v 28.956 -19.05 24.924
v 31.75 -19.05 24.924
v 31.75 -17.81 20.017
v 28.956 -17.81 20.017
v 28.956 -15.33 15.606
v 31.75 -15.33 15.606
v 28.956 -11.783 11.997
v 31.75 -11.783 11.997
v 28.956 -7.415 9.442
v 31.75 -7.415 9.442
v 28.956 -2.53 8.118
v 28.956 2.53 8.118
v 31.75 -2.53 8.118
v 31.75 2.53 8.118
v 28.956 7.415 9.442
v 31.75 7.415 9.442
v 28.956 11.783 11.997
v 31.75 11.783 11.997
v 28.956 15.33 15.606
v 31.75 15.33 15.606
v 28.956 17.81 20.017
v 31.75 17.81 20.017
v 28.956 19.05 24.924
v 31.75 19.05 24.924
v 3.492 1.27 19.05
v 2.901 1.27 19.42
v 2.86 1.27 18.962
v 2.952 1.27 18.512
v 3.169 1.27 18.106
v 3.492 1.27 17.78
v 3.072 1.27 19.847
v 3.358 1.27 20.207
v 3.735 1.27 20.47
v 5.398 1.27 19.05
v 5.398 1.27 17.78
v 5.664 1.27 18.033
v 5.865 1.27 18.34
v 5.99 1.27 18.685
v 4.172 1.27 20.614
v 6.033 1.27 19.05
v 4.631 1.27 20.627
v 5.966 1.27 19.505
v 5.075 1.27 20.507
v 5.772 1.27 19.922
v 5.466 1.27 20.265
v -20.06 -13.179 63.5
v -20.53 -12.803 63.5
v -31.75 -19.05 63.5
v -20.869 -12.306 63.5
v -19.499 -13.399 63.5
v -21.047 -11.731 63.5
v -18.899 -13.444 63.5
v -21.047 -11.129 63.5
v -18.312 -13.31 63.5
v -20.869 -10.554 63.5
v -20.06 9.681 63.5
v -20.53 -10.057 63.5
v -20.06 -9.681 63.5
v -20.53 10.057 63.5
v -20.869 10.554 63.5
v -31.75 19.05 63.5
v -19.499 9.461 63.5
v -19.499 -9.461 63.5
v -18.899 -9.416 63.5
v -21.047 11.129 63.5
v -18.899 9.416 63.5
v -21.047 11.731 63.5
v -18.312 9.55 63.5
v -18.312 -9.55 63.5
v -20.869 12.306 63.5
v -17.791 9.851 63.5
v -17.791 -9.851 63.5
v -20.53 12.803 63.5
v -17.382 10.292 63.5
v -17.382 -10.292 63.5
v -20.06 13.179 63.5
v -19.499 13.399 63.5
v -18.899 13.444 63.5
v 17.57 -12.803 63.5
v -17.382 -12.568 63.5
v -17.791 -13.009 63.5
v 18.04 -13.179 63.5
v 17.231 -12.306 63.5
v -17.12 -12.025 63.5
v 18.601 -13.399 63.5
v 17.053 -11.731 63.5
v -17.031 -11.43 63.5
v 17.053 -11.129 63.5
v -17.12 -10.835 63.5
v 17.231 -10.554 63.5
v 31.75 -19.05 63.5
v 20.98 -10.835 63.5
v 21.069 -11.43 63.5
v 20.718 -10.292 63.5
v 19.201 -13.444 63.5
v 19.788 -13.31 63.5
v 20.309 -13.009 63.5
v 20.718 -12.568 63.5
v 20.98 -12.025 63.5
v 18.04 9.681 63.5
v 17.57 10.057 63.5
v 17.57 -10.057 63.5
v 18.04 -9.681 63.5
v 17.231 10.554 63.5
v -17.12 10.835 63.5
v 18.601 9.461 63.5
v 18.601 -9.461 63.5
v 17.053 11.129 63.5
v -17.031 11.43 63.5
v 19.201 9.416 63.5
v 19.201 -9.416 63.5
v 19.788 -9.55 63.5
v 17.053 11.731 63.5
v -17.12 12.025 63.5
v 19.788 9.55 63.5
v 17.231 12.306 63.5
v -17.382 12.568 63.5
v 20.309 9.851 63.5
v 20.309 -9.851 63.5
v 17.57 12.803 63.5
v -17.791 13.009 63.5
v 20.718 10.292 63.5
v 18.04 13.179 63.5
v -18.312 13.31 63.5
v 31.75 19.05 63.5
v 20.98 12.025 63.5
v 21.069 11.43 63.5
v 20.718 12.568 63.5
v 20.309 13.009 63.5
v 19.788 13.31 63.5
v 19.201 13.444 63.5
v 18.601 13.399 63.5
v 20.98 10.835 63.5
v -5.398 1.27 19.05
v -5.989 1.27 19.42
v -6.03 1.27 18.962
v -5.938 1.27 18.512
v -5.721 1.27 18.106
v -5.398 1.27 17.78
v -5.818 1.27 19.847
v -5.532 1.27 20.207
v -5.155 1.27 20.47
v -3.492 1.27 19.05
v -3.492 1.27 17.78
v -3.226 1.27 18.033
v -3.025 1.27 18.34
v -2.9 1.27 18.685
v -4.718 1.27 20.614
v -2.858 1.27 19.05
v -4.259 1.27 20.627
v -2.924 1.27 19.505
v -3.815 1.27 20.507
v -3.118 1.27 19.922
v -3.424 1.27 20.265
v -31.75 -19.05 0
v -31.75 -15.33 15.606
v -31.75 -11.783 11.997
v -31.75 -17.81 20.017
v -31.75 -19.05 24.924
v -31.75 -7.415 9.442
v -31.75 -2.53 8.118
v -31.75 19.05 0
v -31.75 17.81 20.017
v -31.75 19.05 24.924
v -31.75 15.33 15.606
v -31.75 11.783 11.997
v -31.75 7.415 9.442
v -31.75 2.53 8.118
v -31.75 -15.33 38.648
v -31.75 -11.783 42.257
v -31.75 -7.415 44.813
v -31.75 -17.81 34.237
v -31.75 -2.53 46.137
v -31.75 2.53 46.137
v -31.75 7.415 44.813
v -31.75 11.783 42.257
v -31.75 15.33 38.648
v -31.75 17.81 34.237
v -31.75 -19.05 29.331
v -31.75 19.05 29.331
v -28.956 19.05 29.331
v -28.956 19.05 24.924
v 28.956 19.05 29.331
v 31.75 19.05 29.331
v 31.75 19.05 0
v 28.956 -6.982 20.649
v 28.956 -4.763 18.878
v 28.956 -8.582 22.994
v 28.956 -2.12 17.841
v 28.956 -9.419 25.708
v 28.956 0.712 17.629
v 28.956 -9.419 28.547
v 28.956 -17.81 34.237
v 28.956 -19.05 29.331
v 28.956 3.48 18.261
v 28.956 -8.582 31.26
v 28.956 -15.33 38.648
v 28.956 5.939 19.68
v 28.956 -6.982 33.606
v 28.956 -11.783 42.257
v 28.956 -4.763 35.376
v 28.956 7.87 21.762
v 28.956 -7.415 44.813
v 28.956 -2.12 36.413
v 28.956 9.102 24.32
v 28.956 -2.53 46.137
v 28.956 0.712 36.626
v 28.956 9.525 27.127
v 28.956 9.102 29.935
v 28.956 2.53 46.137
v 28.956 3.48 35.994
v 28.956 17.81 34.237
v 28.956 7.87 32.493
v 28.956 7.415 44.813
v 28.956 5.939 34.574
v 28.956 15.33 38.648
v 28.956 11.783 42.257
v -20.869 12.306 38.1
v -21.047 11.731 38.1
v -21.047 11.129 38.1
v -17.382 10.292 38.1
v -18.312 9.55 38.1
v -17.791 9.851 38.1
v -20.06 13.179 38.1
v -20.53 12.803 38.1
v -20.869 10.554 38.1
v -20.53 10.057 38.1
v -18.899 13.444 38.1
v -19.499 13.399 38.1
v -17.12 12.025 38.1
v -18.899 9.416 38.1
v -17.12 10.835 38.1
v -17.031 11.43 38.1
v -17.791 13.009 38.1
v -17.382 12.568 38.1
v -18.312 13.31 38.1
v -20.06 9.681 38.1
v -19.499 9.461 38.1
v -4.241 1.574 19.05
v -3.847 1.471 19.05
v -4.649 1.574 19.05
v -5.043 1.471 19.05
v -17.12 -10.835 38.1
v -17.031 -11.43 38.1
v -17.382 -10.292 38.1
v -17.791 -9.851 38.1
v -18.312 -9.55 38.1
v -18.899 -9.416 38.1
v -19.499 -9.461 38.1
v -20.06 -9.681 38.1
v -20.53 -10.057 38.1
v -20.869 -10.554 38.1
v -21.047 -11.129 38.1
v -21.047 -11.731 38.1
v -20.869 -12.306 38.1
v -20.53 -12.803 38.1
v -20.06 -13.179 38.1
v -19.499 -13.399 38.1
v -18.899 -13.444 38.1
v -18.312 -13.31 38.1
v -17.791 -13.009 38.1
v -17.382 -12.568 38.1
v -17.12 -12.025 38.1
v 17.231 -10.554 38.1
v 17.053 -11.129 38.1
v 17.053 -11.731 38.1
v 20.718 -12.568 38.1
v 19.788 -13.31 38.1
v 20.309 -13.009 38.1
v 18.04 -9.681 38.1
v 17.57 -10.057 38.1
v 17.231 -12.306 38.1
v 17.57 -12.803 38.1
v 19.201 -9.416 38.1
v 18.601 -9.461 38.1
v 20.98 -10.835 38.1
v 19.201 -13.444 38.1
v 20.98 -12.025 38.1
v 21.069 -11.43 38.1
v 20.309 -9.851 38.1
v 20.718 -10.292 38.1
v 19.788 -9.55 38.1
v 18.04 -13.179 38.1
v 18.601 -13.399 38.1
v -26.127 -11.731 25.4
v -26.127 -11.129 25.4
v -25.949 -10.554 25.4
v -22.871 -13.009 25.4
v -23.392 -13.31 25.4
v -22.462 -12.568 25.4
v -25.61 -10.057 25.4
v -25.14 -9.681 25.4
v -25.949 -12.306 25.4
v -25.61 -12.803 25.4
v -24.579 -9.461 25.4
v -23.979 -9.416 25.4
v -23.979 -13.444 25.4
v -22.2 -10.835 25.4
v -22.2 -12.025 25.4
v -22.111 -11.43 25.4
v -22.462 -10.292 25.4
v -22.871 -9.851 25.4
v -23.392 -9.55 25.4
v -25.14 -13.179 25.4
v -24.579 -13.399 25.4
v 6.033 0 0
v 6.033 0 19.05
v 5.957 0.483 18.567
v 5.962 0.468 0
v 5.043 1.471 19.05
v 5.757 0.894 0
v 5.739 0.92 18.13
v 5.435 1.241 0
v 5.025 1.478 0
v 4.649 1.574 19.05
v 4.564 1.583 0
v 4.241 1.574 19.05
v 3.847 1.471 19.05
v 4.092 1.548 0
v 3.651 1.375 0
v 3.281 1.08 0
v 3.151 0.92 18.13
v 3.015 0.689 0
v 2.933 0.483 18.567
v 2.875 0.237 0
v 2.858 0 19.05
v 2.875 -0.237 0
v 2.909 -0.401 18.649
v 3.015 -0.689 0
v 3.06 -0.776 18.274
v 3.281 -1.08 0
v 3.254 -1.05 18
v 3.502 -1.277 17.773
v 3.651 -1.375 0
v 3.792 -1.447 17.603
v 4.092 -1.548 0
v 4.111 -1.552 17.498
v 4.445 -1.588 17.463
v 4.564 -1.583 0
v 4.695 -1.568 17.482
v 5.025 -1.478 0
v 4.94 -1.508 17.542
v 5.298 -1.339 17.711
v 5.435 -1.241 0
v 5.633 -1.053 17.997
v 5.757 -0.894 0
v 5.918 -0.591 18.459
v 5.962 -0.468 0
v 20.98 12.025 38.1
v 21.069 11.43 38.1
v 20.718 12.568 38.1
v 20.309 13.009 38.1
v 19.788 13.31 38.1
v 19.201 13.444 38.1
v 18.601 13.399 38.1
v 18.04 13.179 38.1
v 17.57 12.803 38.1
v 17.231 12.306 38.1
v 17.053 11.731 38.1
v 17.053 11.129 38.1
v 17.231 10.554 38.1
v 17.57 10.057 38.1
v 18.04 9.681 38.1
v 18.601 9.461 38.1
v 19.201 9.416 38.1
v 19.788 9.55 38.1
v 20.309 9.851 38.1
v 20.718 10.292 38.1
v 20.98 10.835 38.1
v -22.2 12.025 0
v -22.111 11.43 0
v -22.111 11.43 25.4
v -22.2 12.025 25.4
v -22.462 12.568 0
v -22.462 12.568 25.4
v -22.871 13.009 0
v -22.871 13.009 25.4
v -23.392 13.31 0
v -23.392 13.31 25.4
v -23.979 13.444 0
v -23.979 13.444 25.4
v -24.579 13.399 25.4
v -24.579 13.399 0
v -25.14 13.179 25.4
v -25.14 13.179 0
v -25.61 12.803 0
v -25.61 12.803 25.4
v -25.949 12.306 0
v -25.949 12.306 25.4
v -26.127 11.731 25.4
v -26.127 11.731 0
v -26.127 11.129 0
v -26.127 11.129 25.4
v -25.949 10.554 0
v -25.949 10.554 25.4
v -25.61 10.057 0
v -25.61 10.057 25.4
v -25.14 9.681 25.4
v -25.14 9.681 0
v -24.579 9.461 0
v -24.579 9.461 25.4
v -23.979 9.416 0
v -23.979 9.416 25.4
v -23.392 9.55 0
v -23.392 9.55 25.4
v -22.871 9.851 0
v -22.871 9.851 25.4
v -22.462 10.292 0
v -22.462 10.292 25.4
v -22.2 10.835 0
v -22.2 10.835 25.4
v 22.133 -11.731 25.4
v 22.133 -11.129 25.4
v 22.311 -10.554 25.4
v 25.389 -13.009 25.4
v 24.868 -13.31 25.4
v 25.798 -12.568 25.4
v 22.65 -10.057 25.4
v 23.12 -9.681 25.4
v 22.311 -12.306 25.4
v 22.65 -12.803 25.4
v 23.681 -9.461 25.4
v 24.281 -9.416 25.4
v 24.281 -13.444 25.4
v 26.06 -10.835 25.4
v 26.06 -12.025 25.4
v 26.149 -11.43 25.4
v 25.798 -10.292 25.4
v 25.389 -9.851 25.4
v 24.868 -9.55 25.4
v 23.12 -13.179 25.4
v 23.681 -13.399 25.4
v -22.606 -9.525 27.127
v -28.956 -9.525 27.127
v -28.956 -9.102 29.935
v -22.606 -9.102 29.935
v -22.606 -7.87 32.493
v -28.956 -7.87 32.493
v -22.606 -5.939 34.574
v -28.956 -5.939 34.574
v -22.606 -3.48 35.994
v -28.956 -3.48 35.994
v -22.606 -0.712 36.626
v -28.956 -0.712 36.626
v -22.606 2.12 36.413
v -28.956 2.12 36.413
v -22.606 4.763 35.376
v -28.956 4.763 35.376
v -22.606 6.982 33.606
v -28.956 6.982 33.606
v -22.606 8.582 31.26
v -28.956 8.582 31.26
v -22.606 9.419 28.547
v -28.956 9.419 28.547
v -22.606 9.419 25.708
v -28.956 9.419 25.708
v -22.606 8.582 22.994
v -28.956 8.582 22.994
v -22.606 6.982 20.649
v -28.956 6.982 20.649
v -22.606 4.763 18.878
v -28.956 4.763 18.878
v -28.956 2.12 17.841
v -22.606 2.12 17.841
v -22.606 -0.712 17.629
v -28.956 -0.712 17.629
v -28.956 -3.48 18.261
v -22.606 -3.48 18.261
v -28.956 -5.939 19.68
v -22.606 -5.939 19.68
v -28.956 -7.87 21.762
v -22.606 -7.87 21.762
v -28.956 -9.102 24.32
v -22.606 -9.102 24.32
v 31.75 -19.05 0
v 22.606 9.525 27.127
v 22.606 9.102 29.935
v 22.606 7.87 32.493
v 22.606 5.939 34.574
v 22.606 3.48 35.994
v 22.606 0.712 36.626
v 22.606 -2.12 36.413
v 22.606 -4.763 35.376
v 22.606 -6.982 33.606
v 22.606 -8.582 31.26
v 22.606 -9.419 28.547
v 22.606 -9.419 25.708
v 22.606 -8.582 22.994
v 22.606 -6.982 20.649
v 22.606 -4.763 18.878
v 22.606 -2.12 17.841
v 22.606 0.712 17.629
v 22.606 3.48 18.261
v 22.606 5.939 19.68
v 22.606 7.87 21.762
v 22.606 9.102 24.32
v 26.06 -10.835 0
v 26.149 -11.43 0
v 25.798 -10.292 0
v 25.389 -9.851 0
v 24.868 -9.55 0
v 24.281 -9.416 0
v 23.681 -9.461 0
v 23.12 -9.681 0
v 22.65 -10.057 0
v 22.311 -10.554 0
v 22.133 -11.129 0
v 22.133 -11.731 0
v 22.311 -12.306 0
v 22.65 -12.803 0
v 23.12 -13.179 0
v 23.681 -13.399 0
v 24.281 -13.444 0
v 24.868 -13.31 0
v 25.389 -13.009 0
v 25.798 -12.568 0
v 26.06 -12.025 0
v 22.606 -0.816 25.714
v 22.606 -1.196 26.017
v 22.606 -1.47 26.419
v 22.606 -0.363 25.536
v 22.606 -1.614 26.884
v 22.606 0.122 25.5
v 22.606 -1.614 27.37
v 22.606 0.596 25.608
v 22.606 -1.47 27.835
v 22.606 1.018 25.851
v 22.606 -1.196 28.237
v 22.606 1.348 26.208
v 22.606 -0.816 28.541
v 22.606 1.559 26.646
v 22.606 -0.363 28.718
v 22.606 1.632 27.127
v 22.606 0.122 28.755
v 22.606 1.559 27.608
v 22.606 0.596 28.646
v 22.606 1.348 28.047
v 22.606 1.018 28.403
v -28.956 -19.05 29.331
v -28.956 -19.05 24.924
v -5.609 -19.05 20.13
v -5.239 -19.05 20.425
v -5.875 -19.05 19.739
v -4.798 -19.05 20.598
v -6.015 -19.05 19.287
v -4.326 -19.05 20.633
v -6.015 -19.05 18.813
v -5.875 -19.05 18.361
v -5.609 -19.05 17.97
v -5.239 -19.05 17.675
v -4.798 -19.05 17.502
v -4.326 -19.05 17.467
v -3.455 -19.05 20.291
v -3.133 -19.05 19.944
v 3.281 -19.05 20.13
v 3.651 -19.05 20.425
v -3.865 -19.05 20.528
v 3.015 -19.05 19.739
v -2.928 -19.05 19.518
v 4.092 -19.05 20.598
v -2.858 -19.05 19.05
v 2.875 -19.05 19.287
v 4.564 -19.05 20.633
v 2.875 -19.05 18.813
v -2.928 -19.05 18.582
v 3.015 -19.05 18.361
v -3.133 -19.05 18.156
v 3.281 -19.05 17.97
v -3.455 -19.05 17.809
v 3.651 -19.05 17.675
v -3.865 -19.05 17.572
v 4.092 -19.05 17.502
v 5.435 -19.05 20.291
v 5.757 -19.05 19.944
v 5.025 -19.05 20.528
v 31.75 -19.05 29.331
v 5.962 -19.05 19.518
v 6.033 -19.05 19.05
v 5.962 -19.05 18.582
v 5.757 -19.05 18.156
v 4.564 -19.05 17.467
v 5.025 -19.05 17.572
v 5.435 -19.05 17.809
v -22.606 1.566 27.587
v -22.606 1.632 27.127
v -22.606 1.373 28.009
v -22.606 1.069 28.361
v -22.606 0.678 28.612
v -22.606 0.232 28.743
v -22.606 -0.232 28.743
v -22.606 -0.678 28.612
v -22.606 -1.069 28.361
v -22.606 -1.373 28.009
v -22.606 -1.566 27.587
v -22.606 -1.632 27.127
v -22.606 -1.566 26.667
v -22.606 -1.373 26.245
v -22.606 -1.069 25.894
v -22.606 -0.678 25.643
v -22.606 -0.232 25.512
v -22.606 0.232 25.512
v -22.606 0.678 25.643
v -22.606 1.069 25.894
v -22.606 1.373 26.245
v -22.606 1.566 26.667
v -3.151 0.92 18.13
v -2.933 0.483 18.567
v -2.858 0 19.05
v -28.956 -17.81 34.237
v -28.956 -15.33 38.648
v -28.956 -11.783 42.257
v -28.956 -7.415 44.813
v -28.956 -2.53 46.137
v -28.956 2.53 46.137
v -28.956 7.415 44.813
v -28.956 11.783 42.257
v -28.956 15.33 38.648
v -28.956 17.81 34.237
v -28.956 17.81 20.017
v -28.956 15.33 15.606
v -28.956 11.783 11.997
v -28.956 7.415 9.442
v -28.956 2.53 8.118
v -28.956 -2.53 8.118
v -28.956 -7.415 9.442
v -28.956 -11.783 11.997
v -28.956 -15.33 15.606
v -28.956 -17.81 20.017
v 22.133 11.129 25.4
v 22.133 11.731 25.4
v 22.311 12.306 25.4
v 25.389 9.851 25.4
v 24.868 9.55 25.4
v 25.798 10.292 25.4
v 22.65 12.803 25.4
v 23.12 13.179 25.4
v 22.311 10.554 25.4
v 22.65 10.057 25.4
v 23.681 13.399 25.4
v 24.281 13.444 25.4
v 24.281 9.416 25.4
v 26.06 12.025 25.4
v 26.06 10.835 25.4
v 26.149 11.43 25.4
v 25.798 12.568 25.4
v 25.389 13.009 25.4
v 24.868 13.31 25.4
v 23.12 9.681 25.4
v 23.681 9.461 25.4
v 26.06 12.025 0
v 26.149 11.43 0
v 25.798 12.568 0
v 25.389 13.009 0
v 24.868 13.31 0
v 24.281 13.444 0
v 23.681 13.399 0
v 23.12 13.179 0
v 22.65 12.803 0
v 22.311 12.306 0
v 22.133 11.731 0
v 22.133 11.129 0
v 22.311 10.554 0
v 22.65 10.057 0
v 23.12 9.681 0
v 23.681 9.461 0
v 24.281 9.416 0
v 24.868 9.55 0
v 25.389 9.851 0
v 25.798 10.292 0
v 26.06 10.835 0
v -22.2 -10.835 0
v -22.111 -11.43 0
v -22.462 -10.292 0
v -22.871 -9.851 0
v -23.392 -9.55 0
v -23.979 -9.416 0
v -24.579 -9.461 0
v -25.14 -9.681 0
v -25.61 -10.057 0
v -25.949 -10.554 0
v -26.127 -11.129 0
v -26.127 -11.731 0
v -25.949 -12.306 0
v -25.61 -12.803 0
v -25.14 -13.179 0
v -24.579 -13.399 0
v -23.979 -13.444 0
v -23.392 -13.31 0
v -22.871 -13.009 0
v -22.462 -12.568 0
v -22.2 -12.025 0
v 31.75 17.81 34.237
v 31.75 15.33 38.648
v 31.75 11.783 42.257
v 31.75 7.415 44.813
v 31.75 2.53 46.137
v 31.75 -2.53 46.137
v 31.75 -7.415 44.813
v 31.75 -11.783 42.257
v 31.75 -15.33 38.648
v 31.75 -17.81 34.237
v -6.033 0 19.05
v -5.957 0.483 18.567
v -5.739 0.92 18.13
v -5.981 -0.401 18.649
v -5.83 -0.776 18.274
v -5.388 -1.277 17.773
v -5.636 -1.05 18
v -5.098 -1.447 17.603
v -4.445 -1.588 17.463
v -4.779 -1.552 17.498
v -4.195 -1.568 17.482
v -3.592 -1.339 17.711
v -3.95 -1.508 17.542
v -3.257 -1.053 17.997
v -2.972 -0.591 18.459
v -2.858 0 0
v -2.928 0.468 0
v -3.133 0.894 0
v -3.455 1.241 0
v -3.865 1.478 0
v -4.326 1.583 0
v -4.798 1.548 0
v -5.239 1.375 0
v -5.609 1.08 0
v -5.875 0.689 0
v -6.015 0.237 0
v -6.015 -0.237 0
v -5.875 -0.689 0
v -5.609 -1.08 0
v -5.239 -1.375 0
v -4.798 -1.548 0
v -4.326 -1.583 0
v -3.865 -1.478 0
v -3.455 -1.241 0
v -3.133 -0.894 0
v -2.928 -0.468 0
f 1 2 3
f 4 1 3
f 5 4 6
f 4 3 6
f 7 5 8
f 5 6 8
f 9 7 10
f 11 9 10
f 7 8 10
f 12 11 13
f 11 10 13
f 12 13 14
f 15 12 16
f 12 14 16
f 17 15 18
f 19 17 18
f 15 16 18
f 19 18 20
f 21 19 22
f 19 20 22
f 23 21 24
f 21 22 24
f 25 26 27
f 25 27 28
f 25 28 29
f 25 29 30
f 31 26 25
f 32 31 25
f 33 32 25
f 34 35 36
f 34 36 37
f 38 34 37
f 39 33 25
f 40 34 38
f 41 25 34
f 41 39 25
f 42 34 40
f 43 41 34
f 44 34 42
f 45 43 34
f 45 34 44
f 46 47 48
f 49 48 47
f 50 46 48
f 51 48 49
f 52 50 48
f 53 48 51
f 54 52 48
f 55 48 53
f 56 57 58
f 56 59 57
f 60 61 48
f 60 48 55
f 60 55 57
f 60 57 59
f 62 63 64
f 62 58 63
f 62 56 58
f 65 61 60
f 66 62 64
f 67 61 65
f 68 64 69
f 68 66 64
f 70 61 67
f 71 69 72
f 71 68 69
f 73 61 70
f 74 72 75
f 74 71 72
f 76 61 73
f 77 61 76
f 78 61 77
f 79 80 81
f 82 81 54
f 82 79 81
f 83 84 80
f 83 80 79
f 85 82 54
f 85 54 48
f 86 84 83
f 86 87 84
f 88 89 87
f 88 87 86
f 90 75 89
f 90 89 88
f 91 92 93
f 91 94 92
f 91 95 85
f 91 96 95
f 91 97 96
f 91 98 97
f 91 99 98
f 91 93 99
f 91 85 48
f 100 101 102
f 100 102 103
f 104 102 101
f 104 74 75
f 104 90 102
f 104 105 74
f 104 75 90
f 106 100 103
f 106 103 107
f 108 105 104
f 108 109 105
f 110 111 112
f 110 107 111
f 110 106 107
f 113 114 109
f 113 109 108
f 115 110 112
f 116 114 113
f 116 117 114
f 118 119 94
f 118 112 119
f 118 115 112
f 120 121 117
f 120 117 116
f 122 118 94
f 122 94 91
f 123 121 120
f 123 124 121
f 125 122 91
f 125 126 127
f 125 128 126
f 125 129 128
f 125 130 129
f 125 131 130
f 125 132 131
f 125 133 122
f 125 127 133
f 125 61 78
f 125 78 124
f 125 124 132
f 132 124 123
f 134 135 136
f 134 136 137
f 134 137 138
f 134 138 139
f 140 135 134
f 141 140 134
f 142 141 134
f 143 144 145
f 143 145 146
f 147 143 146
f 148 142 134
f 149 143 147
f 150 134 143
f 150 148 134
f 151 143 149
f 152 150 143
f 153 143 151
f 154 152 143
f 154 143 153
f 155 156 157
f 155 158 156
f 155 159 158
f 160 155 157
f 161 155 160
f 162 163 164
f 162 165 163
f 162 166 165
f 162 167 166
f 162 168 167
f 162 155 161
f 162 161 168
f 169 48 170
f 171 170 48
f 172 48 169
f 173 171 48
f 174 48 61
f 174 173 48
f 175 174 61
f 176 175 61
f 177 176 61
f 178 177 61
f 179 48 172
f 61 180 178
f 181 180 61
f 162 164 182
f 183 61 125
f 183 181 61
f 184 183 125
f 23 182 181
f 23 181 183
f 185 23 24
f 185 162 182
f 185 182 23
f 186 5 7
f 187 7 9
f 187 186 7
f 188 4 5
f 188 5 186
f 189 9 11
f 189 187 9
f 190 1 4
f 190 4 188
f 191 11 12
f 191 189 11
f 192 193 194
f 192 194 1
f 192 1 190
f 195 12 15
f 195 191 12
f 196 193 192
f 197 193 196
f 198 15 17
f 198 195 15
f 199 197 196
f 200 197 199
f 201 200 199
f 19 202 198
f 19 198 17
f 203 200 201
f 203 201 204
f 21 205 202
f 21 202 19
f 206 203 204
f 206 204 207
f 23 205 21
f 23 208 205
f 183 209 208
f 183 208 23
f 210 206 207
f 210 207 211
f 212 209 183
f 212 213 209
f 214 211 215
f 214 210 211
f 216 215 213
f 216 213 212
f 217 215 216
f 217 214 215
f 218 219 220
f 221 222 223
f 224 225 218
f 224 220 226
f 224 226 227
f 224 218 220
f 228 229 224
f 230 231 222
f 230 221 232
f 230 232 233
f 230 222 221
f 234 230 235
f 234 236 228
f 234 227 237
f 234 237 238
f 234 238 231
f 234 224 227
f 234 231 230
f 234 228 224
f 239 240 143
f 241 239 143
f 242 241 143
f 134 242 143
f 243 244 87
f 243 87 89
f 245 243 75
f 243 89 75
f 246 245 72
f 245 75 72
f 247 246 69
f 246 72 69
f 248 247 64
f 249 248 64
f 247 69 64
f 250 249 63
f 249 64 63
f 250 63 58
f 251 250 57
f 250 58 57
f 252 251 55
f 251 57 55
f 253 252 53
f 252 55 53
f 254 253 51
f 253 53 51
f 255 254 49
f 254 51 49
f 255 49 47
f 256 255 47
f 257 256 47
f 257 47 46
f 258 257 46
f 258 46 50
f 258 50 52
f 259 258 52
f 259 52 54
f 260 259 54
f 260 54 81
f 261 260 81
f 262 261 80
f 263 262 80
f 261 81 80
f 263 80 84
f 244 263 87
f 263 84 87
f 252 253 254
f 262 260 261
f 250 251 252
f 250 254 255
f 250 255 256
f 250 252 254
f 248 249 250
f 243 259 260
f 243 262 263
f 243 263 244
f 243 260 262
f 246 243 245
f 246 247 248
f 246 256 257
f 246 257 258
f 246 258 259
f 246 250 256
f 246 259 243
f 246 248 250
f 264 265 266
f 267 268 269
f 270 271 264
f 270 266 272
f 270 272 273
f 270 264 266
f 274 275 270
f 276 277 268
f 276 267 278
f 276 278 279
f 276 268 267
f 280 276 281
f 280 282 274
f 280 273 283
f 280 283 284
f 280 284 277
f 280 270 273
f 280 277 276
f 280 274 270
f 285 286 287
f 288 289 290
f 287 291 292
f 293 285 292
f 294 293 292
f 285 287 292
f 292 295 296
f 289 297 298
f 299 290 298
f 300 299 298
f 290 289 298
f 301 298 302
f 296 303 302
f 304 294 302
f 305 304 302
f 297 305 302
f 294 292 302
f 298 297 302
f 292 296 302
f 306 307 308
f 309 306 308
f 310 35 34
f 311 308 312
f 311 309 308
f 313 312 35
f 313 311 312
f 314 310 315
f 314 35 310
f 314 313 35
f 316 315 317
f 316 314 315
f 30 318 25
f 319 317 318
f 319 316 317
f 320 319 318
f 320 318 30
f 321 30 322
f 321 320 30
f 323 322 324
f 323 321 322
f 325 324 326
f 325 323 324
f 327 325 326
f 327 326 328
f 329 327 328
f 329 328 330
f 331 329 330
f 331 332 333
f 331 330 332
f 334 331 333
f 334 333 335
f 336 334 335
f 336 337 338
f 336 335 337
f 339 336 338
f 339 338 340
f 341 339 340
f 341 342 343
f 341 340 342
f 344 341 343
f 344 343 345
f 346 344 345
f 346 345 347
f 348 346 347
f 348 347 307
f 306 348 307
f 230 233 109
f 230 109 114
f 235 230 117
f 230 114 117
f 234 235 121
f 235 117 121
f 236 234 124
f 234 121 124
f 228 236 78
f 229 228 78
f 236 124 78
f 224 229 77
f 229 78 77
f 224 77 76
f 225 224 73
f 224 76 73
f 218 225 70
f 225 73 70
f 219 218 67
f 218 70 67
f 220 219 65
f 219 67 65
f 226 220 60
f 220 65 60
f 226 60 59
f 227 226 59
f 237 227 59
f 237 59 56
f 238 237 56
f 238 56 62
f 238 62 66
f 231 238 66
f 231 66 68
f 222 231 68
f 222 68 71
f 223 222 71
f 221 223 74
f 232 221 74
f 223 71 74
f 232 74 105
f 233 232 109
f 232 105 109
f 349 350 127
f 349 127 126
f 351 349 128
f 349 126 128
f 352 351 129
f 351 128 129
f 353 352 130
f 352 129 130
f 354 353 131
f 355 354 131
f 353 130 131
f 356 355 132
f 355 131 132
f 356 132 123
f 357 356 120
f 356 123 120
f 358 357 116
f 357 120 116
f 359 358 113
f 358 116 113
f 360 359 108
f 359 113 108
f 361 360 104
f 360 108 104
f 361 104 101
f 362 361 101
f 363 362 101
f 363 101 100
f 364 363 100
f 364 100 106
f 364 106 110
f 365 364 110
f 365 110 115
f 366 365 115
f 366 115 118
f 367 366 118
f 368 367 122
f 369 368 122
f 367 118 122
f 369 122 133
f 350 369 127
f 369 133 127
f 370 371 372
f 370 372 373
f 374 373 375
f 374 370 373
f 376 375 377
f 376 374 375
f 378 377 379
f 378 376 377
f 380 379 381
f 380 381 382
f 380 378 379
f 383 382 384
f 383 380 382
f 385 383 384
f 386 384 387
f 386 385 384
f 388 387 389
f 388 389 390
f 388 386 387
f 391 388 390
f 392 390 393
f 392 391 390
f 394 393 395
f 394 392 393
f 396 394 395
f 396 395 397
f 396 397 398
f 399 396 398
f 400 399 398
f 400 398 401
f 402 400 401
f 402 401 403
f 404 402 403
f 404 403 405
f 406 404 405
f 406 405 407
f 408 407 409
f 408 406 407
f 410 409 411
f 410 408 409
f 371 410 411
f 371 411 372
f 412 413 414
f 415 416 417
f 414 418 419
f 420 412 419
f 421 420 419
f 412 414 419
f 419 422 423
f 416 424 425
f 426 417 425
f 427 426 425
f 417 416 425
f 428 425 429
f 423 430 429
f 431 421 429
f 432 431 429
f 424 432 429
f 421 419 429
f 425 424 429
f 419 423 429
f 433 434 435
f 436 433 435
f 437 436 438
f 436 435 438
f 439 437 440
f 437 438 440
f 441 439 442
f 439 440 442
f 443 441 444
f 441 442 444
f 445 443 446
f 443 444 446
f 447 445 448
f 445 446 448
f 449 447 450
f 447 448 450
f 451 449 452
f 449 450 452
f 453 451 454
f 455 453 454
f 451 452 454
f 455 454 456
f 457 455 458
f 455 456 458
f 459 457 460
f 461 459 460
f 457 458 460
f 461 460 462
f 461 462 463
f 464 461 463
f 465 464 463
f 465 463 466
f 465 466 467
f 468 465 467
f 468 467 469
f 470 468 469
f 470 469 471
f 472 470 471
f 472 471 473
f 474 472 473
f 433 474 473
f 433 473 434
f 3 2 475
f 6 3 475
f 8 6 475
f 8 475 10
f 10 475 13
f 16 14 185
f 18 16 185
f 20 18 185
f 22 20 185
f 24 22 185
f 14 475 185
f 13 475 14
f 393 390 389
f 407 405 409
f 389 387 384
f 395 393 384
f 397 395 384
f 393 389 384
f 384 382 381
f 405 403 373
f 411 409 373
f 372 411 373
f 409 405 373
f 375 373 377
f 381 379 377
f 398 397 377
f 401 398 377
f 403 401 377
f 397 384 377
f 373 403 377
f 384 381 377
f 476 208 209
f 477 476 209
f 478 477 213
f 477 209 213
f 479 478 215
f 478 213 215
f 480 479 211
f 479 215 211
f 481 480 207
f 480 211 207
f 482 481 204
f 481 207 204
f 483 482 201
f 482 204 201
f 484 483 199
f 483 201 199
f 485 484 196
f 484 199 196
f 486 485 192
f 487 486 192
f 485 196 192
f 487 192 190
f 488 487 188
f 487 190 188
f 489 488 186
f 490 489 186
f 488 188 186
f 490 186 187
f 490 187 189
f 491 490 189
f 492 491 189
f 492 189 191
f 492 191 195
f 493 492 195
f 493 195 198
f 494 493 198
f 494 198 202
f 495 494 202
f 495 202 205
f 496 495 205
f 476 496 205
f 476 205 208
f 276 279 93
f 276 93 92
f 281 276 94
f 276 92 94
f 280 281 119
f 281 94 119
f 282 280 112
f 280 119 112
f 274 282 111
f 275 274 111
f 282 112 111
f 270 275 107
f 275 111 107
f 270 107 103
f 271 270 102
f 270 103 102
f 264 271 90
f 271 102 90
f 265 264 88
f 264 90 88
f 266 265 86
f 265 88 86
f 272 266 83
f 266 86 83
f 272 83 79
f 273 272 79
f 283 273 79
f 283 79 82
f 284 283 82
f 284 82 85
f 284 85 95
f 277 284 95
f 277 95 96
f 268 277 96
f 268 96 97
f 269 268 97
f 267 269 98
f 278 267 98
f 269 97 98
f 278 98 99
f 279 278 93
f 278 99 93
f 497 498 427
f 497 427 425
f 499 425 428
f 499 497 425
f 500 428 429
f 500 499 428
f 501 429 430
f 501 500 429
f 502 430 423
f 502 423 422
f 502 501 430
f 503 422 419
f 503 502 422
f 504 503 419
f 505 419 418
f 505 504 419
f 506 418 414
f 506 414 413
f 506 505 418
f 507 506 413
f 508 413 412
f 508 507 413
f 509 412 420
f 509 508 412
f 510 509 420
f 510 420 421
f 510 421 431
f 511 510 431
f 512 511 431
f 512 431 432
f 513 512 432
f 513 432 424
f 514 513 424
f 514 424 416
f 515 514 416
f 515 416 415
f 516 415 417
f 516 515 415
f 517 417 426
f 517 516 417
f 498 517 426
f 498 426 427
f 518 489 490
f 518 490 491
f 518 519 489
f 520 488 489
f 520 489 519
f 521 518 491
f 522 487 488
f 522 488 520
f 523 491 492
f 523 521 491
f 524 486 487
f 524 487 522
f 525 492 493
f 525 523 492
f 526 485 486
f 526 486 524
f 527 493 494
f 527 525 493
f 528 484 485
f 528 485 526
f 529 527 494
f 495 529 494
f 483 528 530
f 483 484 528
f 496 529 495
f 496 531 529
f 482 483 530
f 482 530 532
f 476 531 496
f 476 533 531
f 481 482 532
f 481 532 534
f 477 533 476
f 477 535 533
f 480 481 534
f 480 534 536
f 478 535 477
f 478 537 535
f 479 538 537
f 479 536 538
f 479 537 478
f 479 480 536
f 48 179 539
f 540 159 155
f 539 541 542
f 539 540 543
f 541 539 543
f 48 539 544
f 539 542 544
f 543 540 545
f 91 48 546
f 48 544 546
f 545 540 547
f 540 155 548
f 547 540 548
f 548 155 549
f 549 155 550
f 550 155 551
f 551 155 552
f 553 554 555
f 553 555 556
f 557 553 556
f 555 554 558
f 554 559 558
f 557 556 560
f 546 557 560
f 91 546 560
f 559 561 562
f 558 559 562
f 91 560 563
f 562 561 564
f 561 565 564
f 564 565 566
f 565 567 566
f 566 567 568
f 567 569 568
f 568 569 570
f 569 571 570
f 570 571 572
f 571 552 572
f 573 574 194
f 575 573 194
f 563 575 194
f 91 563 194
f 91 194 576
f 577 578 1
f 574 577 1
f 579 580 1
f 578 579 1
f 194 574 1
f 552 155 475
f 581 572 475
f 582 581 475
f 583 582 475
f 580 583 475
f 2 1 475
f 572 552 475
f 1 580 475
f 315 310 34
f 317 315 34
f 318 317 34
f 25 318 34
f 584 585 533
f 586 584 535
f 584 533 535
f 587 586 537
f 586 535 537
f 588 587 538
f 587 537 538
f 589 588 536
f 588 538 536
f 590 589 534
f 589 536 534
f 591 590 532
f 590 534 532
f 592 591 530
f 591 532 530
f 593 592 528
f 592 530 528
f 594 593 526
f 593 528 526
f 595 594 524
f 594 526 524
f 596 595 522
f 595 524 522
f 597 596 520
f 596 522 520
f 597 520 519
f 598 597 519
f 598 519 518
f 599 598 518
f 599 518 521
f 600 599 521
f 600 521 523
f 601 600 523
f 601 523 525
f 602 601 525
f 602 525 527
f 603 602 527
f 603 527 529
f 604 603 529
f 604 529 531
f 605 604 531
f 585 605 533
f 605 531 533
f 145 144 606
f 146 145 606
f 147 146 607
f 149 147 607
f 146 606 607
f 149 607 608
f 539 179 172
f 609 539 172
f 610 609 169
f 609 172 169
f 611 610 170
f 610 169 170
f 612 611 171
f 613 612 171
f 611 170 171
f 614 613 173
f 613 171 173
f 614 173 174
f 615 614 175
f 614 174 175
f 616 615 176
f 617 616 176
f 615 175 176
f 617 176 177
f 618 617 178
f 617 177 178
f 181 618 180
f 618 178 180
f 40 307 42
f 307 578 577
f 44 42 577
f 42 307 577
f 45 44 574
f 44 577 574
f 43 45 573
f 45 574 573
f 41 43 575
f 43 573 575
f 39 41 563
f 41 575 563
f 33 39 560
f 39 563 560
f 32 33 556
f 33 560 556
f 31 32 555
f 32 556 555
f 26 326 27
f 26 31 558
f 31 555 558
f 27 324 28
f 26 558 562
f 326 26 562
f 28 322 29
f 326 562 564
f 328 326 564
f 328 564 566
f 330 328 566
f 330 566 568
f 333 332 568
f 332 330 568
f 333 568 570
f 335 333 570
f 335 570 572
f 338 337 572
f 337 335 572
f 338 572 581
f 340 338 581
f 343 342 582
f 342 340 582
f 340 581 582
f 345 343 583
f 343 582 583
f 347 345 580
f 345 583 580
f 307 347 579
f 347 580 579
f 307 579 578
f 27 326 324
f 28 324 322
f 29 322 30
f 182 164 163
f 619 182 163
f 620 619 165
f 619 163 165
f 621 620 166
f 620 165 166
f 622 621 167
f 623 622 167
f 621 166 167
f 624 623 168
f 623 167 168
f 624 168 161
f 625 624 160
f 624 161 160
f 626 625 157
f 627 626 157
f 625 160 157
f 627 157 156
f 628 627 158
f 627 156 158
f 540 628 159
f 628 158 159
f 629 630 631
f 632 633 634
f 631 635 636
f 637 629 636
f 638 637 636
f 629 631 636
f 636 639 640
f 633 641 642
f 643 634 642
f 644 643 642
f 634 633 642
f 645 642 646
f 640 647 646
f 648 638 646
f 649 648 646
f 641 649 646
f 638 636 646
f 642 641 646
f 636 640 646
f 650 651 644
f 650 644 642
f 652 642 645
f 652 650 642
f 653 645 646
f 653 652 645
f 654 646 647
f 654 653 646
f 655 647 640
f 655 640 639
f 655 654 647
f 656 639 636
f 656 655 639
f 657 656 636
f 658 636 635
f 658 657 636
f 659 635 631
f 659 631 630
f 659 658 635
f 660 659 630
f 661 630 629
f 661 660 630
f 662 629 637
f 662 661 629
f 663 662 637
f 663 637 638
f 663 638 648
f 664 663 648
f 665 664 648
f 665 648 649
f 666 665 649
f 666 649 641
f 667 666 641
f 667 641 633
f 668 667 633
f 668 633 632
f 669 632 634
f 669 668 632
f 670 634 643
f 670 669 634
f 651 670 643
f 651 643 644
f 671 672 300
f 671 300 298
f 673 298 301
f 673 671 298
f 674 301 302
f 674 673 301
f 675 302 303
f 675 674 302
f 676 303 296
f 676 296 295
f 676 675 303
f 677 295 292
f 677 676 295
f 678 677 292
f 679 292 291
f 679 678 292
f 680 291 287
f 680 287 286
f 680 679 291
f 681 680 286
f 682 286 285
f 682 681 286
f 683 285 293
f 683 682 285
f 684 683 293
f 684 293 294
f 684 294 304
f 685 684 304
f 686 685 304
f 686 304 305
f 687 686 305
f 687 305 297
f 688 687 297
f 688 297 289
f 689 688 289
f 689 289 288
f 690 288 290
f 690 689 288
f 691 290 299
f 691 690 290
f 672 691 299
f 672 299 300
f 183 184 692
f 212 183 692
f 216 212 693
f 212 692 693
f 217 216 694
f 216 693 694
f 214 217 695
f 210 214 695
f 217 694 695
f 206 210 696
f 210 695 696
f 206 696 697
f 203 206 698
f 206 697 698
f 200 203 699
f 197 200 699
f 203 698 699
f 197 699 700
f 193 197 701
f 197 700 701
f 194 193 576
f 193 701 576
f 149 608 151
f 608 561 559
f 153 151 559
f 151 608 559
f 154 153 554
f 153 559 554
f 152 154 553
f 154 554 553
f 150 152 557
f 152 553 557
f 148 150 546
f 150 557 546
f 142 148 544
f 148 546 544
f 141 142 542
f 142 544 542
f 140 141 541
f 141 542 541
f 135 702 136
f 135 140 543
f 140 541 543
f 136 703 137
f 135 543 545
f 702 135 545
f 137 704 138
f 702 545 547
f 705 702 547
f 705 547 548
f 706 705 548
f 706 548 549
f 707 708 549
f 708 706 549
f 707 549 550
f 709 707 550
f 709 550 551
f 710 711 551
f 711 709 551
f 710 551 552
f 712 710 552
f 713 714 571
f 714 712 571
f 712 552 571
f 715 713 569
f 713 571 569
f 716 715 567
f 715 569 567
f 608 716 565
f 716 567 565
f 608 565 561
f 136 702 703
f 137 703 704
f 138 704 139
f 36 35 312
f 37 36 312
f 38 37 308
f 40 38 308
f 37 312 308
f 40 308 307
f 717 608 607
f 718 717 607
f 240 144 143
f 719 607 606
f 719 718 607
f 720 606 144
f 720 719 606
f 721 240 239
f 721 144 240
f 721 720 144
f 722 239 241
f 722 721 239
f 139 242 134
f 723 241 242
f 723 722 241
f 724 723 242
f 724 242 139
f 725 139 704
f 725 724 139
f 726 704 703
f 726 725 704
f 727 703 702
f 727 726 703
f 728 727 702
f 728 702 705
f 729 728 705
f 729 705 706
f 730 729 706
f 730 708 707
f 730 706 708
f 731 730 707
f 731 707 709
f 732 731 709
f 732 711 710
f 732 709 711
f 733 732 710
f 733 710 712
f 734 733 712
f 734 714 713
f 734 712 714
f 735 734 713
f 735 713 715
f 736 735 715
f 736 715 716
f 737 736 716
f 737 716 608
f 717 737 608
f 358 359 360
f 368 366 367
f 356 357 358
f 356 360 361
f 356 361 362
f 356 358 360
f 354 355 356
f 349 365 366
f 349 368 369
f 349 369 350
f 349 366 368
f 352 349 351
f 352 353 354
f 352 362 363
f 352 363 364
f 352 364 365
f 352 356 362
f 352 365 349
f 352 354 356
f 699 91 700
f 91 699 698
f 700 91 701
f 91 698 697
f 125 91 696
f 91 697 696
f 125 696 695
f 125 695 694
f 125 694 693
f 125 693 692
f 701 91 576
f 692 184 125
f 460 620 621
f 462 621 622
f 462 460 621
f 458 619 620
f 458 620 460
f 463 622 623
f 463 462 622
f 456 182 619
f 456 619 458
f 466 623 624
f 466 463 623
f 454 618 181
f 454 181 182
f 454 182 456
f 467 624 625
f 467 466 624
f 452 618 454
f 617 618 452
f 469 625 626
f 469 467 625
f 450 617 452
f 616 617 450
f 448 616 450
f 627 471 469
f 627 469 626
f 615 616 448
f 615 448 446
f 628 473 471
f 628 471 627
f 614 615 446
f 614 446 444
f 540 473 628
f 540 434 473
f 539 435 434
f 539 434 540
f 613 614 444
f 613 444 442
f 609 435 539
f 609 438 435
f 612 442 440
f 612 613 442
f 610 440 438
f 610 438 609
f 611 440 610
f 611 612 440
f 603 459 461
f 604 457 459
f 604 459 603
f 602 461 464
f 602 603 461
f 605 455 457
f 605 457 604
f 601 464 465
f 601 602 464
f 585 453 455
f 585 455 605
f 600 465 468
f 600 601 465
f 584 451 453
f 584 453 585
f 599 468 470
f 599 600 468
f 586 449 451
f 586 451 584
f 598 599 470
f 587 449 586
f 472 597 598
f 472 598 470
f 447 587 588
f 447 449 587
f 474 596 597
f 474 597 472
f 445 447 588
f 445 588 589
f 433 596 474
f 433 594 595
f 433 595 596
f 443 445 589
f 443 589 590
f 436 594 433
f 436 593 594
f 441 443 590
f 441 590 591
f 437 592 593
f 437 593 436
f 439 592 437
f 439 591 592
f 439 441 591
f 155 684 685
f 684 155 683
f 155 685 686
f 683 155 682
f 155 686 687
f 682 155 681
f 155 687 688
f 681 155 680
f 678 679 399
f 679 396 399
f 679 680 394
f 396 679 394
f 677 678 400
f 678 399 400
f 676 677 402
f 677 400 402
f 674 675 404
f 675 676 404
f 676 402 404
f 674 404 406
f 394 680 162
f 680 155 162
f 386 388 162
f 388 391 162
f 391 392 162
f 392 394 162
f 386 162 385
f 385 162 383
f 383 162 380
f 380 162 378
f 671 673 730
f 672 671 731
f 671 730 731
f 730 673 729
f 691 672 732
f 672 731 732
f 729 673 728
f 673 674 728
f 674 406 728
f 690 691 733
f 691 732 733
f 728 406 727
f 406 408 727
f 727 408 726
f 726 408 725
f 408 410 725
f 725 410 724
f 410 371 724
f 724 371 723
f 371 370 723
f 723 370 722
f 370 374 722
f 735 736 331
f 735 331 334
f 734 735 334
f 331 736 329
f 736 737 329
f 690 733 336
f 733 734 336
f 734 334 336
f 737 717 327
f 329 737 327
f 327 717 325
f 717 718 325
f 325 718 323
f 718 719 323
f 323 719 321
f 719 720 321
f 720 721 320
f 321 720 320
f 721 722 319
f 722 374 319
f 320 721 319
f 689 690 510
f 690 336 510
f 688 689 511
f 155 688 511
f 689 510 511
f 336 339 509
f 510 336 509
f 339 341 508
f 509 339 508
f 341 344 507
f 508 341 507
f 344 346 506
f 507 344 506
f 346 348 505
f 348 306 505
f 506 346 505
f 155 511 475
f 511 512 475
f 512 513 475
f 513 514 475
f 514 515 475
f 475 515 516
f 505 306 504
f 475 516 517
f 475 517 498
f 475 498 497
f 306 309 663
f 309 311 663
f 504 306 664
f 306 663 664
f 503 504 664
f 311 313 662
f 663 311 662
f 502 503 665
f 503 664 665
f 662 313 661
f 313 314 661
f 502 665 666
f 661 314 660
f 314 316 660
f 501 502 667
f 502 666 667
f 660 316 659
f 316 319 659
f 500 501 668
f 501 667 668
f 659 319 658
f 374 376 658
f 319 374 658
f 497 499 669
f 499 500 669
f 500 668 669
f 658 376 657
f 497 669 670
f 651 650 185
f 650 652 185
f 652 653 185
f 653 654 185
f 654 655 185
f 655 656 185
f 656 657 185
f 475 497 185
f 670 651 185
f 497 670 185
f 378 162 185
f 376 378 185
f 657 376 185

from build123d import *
from build123d import SkipClean  # not in build123d's __all__

# Parameters (mm, degrees)
F0_W      = 63.5
F0_H      = 38.1
F0_R      = 2.0193
F1_DEPTH  = 63.5
F2_DEPTH  = 25.4
F3_R      = 2.0193
F4_DEPTH  = 25.4
F5_R      = 1.5875
F6_DEPTH  = 19.05
F7_R      = 1.5875
F8_DEPTH  = 20.32
F9_R      = 1.63195
F10_DEPTH = 63.501
F9_R_2    = 9.525
F11_DEPTH = 9.144
F12_DEPTH = 2.794
F13_R     = 9.525
F13_R_2   = 1.63195
F14_DEPTH = 9.144
F15_DEPTH = 2.794


with BuildPart() as f1:
    # F0 (on Top) → F1 (new body)
    with BuildSketch(Plane.XY):
        Rectangle(F0_W, F0_H)
        with Locations((-24.13, -11.43)):
            Circle(F0_R, mode=Mode.SUBTRACT)
        with Locations((24.13, -11.43)):
            Circle(F0_R, mode=Mode.SUBTRACT)
        with Locations((-24.13, 11.43)):
            Circle(F0_R, mode=Mode.SUBTRACT)
        with Locations((24.13, 11.43)):
            Circle(F0_R, mode=Mode.SUBTRACT)
        with Locations((-24.13, 11.43)):
            Circle(F0_R)
        with Locations((24.13, 11.43)):
            Circle(F0_R)
        with Locations((24.13, -11.43)):
            Circle(F0_R)
        with Locations((-24.13, -11.43)):
            Circle(F0_R)
    extrude(amount=F1_DEPTH)

    # F0 (on Top) → F2 (cut)
    with BuildSketch(Plane.XY):
        with Locations((24.13, 11.43)):
            Circle(F0_R)
        with Locations((24.13, -11.43)):
            Circle(F0_R)
        with Locations((-24.13, 11.43)):
            Circle(F0_R)
        with Locations((-24.13, -11.43)):
            Circle(F0_R)
    extrude(amount=F2_DEPTH, mode=Mode.SUBTRACT)

    # F3 (on face) → F4 (cut)
    with BuildSketch(Plane.XY.offset(63.5)):
        with Locations((-19.05, 11.43)):
            Circle(F3_R)
        with Locations((-19.05, -11.43)):
            Circle(F3_R)
        with Locations((19.05, 11.43)):
            Circle(F3_R)
        with Locations((19.05, -11.43)):
            Circle(F3_R)
    extrude(amount=-F4_DEPTH, mode=Mode.SUBTRACT)

    # F5 (on face) → F6 (cut)
    with BuildSketch(Plane.XY):
        with Locations((-4.445, 0)):
            Circle(F5_R)
        with Locations((4.445, 0)):
            Circle(F5_R)
    extrude(amount=F6_DEPTH, mode=Mode.SUBTRACT)

    # F7 (on face) → F8 (cut)
    with BuildSketch(Plane.XZ.offset(19.05)):
        with Locations((-4.445, 19.05)):
            Circle(F7_R)
        with Locations((4.445, 19.05)):
            Circle(F7_R)
    with SkipClean():  # cleaning this boolean's faces spoils the solid; the shape is the same uncleaned
        extrude(amount=-F8_DEPTH, mode=Mode.SUBTRACT)

    # F9 (on face) → F10 (cut, through all)
    with BuildSketch(Plane.YZ.offset(31.75)):
        with Locations((0, 27.1272)):
            Circle(F9_R)
    with SkipClean():  # cleaning this boolean's faces spoils the solid; the shape is the same uncleaned
        extrude(amount=-F10_DEPTH, mode=Mode.SUBTRACT)

    # F9 (on face) → F11 (cut)
    with BuildSketch(Plane.YZ.offset(31.75)):
        with Locations((0, 27.1272)):
            Circle(F9_R_2)
        with Locations((0, 27.1272)):
            Circle(F9_R, mode=Mode.SUBTRACT)
    with SkipClean():  # cleaning this boolean's faces spoils the solid; the shape is the same uncleaned
        extrude(amount=-F11_DEPTH, mode=Mode.SUBTRACT)

    # F9 (on face) → F12 (cut)
    with BuildSketch(Plane.YZ.offset(31.75)):
        with BuildLine():
            Line((19.05, 24.9238323502), (19.05, 29.3305676498))
            ThreePointArc((19.05, 29.3305676498), (0, 46.3042), (-19.05, 29.3305676498))
            Line((-19.05, 29.3305676498), (-19.05, 24.9238323502))
            ThreePointArc((-19.05, 24.9238323502), (0, 7.9502), (19.05, 24.9238323502))
        make_face()
        with Locations((0, 27.1272)):
            Circle(F9_R_2, mode=Mode.SUBTRACT)
    with SkipClean():  # cleaning this boolean's faces spoils the solid; the shape is the same uncleaned
        extrude(amount=-F12_DEPTH, mode=Mode.SUBTRACT)

    # F13 (on face) → F14 (cut)
    with BuildSketch(Plane(origin=(-31.75, 0, 0), x_dir=(0, -1, 0), z_dir=(-1, 0, 0))):
        with Locations((0, 27.1272)):
            Circle(F13_R)
        with Locations((0, 27.1272)):
            Circle(F13_R_2, mode=Mode.SUBTRACT)
    with SkipClean():  # cleaning this boolean's faces spoils the solid; the shape is the same uncleaned
        extrude(amount=-F14_DEPTH, mode=Mode.SUBTRACT)

    # F13 (on face) → F15 (cut)
    with BuildSketch(Plane(origin=(-31.75, 0, 0), x_dir=(0, -1, 0), z_dir=(-1, 0, 0))):
        with BuildLine():
            Line((19.05, 24.9238323502), (19.05, 29.3305676498))
            ThreePointArc((19.05, 29.3305676498), (0, 46.3042), (-19.05, 29.3305676498))
            Line((-19.05, 29.3305676498), (-19.05, 24.9238323502))
            ThreePointArc((-19.05, 24.9238323502), (0, 7.9502), (19.05, 24.9238323502))
        make_face()
        with Locations((0, 27.1272)):
            Circle(F13_R, mode=Mode.SUBTRACT)
    with SkipClean():  # cleaning this boolean's faces spoils the solid; the shape is the same uncleaned
        extrude(amount=-F15_DEPTH, mode=Mode.SUBTRACT)


solid = f1.part
